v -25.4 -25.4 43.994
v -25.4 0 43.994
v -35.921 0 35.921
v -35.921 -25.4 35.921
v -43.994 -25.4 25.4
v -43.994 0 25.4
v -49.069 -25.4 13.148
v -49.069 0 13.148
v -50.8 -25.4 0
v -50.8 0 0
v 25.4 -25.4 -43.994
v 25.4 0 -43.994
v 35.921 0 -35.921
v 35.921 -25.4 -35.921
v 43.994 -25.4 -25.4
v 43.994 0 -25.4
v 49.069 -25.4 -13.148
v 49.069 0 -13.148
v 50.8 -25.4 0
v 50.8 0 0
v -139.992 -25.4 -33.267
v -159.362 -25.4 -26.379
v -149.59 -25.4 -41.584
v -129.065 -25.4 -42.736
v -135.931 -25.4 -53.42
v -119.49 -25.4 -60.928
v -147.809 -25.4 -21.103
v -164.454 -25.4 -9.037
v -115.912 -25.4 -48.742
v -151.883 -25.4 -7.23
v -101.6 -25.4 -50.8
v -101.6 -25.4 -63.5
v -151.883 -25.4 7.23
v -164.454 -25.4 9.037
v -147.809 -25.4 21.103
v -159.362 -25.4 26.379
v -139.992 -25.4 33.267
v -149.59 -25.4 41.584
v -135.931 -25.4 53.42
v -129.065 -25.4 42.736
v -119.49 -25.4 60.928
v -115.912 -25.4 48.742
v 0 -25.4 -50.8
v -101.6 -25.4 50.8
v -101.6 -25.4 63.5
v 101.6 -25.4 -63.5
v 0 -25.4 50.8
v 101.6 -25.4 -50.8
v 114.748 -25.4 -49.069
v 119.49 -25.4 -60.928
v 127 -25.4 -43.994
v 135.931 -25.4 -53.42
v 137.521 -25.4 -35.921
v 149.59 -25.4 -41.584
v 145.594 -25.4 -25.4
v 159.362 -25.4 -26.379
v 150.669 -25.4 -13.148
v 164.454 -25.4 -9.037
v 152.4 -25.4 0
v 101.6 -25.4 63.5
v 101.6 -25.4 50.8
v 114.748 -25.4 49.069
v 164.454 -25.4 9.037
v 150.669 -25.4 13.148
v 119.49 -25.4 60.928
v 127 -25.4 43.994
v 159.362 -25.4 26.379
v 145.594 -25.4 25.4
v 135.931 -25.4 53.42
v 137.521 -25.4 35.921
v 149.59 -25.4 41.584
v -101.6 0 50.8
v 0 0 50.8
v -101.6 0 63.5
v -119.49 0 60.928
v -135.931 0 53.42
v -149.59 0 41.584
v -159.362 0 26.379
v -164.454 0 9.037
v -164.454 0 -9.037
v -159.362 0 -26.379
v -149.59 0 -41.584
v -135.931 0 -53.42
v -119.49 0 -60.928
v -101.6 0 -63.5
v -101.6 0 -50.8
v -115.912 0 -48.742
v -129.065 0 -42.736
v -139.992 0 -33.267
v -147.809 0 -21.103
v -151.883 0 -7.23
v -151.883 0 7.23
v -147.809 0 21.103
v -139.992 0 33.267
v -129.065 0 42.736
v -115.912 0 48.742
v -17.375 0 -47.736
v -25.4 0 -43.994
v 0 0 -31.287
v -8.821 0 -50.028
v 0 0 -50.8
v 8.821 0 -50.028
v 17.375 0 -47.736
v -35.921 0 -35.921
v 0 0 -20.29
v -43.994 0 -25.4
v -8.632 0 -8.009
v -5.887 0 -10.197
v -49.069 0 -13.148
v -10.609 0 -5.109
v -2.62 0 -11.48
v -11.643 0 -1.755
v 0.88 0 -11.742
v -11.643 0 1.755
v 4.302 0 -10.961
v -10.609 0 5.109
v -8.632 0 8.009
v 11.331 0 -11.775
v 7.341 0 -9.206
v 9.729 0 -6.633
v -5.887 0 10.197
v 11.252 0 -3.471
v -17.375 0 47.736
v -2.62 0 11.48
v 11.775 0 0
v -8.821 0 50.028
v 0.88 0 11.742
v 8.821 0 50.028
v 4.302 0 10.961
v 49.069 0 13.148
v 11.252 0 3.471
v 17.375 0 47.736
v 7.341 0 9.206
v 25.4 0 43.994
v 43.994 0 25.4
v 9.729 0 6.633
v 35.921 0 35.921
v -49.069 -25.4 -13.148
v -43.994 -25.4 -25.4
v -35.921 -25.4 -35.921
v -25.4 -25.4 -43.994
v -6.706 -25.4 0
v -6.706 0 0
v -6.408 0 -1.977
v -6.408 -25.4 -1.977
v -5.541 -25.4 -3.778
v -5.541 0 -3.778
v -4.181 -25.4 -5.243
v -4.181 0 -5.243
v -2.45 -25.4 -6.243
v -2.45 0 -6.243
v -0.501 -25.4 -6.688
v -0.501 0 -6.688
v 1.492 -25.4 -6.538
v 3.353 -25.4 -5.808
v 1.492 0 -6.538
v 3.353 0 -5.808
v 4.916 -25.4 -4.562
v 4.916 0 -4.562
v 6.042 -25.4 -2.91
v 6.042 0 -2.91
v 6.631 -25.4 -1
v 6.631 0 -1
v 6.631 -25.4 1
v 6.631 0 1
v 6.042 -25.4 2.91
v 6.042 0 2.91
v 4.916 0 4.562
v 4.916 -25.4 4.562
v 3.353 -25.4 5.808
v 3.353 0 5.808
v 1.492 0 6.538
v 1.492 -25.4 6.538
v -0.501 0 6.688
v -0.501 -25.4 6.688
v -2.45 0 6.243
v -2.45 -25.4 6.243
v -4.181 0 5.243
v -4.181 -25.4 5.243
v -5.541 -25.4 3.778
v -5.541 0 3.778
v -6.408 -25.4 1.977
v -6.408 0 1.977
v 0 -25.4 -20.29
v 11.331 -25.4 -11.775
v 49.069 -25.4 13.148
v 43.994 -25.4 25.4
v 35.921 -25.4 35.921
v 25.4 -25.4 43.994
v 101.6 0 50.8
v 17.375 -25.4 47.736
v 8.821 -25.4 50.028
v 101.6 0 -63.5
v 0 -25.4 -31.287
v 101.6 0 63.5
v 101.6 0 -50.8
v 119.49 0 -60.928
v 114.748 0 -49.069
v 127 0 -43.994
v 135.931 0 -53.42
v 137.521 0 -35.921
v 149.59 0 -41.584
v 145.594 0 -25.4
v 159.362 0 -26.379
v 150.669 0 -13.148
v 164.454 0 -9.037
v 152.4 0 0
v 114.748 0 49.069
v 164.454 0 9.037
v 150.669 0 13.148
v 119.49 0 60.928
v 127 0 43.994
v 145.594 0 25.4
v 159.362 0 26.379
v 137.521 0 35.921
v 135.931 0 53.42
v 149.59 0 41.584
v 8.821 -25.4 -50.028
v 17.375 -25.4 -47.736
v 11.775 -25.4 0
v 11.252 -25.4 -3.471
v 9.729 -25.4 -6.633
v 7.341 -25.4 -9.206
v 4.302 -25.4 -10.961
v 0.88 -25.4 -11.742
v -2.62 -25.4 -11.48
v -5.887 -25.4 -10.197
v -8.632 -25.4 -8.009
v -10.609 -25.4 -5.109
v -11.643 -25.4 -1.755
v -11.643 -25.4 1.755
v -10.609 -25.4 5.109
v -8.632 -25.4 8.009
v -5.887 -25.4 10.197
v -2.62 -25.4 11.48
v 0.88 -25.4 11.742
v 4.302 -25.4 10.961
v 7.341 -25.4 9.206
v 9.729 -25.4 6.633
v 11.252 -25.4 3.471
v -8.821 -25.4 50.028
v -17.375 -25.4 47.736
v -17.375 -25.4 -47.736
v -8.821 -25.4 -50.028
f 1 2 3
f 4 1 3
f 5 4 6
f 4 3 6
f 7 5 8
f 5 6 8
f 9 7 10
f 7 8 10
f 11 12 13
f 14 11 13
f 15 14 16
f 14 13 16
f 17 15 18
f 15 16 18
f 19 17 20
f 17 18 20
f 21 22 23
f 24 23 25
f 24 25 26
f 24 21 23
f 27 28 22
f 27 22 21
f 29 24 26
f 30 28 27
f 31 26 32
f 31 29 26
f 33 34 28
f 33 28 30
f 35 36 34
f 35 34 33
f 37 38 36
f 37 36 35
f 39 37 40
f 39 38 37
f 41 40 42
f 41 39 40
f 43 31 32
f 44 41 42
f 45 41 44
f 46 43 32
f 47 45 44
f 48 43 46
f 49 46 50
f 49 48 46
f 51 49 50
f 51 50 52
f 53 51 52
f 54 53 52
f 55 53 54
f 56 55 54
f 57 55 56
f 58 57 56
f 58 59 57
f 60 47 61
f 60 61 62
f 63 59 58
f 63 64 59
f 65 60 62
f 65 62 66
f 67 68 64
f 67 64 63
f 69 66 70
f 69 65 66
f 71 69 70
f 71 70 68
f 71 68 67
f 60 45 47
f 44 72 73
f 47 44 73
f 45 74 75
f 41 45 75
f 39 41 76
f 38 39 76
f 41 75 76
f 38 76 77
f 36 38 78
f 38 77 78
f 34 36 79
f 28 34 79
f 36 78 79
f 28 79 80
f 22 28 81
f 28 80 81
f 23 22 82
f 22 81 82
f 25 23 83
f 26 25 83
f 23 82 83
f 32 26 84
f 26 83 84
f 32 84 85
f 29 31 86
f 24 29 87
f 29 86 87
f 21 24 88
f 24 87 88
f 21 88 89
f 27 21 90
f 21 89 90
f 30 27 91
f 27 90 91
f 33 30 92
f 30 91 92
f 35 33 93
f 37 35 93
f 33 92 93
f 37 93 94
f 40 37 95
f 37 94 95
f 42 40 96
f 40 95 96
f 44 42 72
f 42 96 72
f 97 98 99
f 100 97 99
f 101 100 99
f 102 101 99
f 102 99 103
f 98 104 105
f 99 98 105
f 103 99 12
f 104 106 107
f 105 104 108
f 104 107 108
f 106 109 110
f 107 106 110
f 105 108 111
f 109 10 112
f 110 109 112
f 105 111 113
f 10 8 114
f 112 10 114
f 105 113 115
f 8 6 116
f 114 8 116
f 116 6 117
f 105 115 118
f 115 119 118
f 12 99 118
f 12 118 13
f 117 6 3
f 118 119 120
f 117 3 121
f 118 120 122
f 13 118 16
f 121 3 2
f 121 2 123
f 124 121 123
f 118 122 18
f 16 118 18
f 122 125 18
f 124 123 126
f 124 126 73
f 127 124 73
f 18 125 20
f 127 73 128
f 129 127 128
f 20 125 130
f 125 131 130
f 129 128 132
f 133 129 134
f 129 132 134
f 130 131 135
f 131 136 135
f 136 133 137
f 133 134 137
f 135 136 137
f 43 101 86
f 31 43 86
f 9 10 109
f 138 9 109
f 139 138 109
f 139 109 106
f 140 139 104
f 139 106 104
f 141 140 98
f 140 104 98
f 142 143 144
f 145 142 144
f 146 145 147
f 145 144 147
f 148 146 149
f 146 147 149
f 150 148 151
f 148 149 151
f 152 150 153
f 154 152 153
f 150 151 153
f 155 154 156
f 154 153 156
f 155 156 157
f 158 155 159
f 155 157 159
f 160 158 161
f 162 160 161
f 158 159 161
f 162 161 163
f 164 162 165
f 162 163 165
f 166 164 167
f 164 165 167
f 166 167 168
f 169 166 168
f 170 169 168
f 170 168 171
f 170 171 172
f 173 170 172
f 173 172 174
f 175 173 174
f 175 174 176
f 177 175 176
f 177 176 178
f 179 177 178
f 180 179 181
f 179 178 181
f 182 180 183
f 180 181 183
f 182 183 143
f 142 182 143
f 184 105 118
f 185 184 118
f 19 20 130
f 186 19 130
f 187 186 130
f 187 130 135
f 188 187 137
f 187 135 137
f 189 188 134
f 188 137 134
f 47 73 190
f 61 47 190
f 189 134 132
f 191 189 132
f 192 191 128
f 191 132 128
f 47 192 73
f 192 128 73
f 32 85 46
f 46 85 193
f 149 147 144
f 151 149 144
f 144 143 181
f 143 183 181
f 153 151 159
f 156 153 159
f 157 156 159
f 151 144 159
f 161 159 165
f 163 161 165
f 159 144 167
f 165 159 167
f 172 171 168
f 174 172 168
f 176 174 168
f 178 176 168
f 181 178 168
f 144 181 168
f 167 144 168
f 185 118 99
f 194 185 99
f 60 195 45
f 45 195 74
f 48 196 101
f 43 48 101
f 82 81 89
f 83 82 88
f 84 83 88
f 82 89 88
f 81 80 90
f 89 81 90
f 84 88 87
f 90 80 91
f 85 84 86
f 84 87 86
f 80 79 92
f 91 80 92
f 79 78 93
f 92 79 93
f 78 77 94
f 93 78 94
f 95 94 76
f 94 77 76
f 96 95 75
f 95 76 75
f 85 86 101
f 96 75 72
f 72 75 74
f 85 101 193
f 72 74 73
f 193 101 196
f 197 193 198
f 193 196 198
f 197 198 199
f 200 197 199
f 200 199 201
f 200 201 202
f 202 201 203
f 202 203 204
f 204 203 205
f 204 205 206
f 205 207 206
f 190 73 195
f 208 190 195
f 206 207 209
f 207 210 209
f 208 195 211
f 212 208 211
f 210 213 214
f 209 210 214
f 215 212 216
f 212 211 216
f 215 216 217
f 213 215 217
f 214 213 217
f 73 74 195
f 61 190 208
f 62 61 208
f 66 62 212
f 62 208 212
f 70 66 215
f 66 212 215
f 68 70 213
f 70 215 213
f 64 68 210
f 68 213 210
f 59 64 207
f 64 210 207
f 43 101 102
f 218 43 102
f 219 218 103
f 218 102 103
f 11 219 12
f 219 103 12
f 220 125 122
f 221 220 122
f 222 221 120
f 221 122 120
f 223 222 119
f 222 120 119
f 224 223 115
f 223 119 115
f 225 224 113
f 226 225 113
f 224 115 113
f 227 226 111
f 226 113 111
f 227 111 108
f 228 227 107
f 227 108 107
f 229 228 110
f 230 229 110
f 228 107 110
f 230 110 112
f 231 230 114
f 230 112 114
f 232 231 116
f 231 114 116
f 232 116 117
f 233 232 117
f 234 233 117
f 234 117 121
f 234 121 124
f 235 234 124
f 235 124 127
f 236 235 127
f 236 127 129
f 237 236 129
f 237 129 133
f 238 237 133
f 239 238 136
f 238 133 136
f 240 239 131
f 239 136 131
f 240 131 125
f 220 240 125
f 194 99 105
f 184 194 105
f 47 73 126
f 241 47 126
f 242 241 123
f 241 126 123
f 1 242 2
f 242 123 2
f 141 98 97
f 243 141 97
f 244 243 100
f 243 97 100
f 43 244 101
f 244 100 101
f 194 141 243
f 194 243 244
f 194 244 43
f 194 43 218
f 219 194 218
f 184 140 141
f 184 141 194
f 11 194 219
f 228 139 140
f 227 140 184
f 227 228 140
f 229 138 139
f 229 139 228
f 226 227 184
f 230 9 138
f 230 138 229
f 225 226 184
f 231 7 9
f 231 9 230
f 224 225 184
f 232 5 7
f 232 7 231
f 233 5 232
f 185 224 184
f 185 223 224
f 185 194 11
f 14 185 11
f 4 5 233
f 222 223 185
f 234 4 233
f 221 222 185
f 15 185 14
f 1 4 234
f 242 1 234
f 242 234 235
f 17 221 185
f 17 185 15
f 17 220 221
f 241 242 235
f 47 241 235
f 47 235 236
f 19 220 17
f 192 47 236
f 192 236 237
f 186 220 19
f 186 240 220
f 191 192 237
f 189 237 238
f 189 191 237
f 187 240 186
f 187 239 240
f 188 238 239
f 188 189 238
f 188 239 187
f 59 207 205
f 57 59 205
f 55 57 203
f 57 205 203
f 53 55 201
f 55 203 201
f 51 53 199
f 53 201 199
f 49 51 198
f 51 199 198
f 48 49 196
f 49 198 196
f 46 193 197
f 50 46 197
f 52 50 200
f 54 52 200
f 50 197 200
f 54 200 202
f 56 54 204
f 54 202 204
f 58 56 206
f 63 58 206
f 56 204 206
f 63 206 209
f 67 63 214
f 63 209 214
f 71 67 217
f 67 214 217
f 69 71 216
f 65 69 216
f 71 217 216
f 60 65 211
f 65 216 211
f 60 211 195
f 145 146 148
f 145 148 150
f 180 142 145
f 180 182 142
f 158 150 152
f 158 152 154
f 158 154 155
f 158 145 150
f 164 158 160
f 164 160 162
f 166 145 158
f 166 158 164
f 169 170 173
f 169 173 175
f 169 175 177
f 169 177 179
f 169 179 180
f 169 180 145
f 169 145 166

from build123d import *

# Parameters (mm, degrees)
F1_DEPTH = 25.4
F2_DEPTH = 25.4
F3_DEPTH = 25.4


with BuildPart() as f1:
    # F0 (on Front) → F1 (new body)
    with BuildSketch(Plane.XZ):
        with BuildLine():
            Line((11.774747, 0), (50.8, 0))
            ThreePointArc((50.8, 0), (43.994091, 25.4), (25.4, 43.994091))
            ThreePointArc((25.4, 43.994091), (13.148007, 49.069032), (0, 50.8))
            ThreePointArc((0, 50.8), (-13.148007, 49.069032), (-25.4, 43.994091))
            ThreePointArc((-25.4, 43.994091), (-43.994091, 25.4), (-50.8, 0))
            Line((-50.8, 0), (-11.774747, 0))
            ThreePointArc((-11.774747, 0), (0, 11.774747), (11.774747, 0))
        make_face()
        with BuildLine():
            ThreePointArc((25.4, -43.994091), (43.994091, -25.4), (50.8, 0))
            Line((50.8, 0), (11.774747, 0))
            ThreePointArc((11.774747, 0), (0, -11.774747), (-11.774747, 0))
            Line((-11.774747, 0), (-50.8, 0))
            ThreePointArc((-50.8, 0), (-43.994091, -25.4), (-25.4, -43.994091))
            ThreePointArc((-25.4, -43.994091), (-13.148007, -49.069032), (0, -50.8))
            ThreePointArc((0, -50.8), (13.148008, -49.069032), (25.4, -43.994091))
        make_face()
        Polygon((11.330799, -11.774747), (0, -31.287373), (0, -20.290352), align=None, mode=Mode.SUBTRACT)
    extrude(amount=F1_DEPTH)

    # F0 (on Front) → F2 (join)
    with BuildSketch(Plane.XZ):
        with BuildLine():
            Line((101.6, 63.5), (-101.6, 63.5))
            ThreePointArc((-101.6, 63.5), (-165.1, 0), (-101.6, -63.5))
            Line((-101.6, -63.5), (101.6, -63.5))
            ThreePointArc((101.6, -63.5), (165.1, 0), (101.6, 63.5))
        make_face()
        with BuildLine():
            Line((-101.6, 50.8), (0, 50.8))
            Line((0, 50.8), (101.6, 50.8))
            ThreePointArc((101.6, 50.8), (137.521024, 35.921024), (152.4, 0))
            ThreePointArc((152.4, 0), (137.521024, -35.921024), (101.6, -50.8))
            Line((101.6, -50.8), (0, -50.8))
            Line((0, -50.8), (-101.6, -50.8))
            ThreePointArc((-101.6, -50.8), (-152.4, 0), (-101.6, 50.8))
        make_face(mode=Mode.SUBTRACT)
    extrude(amount=F2_DEPTH)


with BuildPart() as f3:
    # F0 (on Front) → F3 (new body)
    with BuildSketch(Plane.XZ):
        with BuildLine():
            Line((0, 0), (6.70639, 0))
            ThreePointArc((6.70639, 0), (0, 6.70639), (-6.70639, 0))
            Line((-6.70639, 0), (0, 0))
        make_face()
        with BuildLine():
            ThreePointArc((-6.70639, 0), (0, -6.70639), (6.70639, 0))
            Line((6.70639, 0), (0, 0))
            Line((0, 0), (-6.70639, 0))
        make_face()
    extrude(amount=F3_DEPTH)


solid = Compound([f1.part, f3.part])
